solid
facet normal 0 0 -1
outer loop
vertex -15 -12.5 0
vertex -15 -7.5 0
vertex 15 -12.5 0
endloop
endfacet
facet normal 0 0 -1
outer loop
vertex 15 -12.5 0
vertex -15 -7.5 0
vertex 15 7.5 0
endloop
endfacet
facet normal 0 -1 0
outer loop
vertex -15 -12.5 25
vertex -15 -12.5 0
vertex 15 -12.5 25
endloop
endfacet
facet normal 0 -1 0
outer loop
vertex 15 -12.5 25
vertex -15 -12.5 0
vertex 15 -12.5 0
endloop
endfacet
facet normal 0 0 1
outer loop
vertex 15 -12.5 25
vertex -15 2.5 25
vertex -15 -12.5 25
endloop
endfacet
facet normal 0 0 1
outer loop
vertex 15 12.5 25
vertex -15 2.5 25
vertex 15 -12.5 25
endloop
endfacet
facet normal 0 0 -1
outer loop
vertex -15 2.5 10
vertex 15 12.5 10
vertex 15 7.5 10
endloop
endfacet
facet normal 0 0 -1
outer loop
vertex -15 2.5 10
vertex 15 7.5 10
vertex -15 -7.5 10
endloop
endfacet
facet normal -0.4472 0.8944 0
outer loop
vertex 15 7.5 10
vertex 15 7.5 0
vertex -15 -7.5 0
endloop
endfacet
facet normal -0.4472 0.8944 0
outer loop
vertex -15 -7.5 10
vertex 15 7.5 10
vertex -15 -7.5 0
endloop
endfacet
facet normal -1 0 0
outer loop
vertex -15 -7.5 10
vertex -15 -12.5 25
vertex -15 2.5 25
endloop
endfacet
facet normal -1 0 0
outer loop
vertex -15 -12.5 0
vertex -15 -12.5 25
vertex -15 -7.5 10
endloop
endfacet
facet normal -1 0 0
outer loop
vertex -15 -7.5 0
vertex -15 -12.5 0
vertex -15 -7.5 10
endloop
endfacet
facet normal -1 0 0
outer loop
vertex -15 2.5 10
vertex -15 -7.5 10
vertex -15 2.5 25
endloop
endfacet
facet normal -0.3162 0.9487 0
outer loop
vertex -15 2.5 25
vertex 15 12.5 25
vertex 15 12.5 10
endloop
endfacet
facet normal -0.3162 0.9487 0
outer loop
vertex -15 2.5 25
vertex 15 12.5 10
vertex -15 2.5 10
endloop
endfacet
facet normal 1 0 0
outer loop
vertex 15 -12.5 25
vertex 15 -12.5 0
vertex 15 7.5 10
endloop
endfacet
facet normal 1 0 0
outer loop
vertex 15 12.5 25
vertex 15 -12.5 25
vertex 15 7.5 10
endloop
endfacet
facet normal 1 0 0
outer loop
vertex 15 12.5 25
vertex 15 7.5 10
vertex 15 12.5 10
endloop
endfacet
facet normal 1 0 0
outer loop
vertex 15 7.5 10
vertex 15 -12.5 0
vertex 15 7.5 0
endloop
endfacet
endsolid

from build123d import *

# Parameters (mm, degrees)
SKETCH1_W           = 30
SKETCH1_H           = 25
BOSS_EXTRUDE1_DEPTH = 25
CUT_EXTRUDE1_DEPTH  = 26
CUT_EXTRUDE2_DEPTH  = 10


with BuildPart() as part:
    # Sketch1 → Boss-Extrude1 (new body)
    with BuildSketch(Plane.XY):
        Rectangle(SKETCH1_W, SKETCH1_H)
    extrude(amount=BOSS_EXTRUDE1_DEPTH)

    # Sketch3 → Cut-Extrude1 (cut, through all)
    with BuildSketch(Plane.XY.offset(25)):
        Polygon((15, 12.5), (-15, 2.5), (-15, 12.5), align=None)
    extrude(amount=-CUT_EXTRUDE1_DEPTH, mode=Mode.SUBTRACT)

    # Sketch4 → Cut-Extrude2 (cut)
    with BuildSketch(Plane(origin=(0, 0, 0), x_dir=(-1, 0, 0), z_dir=(0, 0, -1))):
        Polygon((-15, 12.5), (-15, 7.5), (15, -7.5), (15, 2.5), align=None)
    extrude(amount=-CUT_EXTRUDE2_DEPTH, mode=Mode.SUBTRACT)


solid = part.part
